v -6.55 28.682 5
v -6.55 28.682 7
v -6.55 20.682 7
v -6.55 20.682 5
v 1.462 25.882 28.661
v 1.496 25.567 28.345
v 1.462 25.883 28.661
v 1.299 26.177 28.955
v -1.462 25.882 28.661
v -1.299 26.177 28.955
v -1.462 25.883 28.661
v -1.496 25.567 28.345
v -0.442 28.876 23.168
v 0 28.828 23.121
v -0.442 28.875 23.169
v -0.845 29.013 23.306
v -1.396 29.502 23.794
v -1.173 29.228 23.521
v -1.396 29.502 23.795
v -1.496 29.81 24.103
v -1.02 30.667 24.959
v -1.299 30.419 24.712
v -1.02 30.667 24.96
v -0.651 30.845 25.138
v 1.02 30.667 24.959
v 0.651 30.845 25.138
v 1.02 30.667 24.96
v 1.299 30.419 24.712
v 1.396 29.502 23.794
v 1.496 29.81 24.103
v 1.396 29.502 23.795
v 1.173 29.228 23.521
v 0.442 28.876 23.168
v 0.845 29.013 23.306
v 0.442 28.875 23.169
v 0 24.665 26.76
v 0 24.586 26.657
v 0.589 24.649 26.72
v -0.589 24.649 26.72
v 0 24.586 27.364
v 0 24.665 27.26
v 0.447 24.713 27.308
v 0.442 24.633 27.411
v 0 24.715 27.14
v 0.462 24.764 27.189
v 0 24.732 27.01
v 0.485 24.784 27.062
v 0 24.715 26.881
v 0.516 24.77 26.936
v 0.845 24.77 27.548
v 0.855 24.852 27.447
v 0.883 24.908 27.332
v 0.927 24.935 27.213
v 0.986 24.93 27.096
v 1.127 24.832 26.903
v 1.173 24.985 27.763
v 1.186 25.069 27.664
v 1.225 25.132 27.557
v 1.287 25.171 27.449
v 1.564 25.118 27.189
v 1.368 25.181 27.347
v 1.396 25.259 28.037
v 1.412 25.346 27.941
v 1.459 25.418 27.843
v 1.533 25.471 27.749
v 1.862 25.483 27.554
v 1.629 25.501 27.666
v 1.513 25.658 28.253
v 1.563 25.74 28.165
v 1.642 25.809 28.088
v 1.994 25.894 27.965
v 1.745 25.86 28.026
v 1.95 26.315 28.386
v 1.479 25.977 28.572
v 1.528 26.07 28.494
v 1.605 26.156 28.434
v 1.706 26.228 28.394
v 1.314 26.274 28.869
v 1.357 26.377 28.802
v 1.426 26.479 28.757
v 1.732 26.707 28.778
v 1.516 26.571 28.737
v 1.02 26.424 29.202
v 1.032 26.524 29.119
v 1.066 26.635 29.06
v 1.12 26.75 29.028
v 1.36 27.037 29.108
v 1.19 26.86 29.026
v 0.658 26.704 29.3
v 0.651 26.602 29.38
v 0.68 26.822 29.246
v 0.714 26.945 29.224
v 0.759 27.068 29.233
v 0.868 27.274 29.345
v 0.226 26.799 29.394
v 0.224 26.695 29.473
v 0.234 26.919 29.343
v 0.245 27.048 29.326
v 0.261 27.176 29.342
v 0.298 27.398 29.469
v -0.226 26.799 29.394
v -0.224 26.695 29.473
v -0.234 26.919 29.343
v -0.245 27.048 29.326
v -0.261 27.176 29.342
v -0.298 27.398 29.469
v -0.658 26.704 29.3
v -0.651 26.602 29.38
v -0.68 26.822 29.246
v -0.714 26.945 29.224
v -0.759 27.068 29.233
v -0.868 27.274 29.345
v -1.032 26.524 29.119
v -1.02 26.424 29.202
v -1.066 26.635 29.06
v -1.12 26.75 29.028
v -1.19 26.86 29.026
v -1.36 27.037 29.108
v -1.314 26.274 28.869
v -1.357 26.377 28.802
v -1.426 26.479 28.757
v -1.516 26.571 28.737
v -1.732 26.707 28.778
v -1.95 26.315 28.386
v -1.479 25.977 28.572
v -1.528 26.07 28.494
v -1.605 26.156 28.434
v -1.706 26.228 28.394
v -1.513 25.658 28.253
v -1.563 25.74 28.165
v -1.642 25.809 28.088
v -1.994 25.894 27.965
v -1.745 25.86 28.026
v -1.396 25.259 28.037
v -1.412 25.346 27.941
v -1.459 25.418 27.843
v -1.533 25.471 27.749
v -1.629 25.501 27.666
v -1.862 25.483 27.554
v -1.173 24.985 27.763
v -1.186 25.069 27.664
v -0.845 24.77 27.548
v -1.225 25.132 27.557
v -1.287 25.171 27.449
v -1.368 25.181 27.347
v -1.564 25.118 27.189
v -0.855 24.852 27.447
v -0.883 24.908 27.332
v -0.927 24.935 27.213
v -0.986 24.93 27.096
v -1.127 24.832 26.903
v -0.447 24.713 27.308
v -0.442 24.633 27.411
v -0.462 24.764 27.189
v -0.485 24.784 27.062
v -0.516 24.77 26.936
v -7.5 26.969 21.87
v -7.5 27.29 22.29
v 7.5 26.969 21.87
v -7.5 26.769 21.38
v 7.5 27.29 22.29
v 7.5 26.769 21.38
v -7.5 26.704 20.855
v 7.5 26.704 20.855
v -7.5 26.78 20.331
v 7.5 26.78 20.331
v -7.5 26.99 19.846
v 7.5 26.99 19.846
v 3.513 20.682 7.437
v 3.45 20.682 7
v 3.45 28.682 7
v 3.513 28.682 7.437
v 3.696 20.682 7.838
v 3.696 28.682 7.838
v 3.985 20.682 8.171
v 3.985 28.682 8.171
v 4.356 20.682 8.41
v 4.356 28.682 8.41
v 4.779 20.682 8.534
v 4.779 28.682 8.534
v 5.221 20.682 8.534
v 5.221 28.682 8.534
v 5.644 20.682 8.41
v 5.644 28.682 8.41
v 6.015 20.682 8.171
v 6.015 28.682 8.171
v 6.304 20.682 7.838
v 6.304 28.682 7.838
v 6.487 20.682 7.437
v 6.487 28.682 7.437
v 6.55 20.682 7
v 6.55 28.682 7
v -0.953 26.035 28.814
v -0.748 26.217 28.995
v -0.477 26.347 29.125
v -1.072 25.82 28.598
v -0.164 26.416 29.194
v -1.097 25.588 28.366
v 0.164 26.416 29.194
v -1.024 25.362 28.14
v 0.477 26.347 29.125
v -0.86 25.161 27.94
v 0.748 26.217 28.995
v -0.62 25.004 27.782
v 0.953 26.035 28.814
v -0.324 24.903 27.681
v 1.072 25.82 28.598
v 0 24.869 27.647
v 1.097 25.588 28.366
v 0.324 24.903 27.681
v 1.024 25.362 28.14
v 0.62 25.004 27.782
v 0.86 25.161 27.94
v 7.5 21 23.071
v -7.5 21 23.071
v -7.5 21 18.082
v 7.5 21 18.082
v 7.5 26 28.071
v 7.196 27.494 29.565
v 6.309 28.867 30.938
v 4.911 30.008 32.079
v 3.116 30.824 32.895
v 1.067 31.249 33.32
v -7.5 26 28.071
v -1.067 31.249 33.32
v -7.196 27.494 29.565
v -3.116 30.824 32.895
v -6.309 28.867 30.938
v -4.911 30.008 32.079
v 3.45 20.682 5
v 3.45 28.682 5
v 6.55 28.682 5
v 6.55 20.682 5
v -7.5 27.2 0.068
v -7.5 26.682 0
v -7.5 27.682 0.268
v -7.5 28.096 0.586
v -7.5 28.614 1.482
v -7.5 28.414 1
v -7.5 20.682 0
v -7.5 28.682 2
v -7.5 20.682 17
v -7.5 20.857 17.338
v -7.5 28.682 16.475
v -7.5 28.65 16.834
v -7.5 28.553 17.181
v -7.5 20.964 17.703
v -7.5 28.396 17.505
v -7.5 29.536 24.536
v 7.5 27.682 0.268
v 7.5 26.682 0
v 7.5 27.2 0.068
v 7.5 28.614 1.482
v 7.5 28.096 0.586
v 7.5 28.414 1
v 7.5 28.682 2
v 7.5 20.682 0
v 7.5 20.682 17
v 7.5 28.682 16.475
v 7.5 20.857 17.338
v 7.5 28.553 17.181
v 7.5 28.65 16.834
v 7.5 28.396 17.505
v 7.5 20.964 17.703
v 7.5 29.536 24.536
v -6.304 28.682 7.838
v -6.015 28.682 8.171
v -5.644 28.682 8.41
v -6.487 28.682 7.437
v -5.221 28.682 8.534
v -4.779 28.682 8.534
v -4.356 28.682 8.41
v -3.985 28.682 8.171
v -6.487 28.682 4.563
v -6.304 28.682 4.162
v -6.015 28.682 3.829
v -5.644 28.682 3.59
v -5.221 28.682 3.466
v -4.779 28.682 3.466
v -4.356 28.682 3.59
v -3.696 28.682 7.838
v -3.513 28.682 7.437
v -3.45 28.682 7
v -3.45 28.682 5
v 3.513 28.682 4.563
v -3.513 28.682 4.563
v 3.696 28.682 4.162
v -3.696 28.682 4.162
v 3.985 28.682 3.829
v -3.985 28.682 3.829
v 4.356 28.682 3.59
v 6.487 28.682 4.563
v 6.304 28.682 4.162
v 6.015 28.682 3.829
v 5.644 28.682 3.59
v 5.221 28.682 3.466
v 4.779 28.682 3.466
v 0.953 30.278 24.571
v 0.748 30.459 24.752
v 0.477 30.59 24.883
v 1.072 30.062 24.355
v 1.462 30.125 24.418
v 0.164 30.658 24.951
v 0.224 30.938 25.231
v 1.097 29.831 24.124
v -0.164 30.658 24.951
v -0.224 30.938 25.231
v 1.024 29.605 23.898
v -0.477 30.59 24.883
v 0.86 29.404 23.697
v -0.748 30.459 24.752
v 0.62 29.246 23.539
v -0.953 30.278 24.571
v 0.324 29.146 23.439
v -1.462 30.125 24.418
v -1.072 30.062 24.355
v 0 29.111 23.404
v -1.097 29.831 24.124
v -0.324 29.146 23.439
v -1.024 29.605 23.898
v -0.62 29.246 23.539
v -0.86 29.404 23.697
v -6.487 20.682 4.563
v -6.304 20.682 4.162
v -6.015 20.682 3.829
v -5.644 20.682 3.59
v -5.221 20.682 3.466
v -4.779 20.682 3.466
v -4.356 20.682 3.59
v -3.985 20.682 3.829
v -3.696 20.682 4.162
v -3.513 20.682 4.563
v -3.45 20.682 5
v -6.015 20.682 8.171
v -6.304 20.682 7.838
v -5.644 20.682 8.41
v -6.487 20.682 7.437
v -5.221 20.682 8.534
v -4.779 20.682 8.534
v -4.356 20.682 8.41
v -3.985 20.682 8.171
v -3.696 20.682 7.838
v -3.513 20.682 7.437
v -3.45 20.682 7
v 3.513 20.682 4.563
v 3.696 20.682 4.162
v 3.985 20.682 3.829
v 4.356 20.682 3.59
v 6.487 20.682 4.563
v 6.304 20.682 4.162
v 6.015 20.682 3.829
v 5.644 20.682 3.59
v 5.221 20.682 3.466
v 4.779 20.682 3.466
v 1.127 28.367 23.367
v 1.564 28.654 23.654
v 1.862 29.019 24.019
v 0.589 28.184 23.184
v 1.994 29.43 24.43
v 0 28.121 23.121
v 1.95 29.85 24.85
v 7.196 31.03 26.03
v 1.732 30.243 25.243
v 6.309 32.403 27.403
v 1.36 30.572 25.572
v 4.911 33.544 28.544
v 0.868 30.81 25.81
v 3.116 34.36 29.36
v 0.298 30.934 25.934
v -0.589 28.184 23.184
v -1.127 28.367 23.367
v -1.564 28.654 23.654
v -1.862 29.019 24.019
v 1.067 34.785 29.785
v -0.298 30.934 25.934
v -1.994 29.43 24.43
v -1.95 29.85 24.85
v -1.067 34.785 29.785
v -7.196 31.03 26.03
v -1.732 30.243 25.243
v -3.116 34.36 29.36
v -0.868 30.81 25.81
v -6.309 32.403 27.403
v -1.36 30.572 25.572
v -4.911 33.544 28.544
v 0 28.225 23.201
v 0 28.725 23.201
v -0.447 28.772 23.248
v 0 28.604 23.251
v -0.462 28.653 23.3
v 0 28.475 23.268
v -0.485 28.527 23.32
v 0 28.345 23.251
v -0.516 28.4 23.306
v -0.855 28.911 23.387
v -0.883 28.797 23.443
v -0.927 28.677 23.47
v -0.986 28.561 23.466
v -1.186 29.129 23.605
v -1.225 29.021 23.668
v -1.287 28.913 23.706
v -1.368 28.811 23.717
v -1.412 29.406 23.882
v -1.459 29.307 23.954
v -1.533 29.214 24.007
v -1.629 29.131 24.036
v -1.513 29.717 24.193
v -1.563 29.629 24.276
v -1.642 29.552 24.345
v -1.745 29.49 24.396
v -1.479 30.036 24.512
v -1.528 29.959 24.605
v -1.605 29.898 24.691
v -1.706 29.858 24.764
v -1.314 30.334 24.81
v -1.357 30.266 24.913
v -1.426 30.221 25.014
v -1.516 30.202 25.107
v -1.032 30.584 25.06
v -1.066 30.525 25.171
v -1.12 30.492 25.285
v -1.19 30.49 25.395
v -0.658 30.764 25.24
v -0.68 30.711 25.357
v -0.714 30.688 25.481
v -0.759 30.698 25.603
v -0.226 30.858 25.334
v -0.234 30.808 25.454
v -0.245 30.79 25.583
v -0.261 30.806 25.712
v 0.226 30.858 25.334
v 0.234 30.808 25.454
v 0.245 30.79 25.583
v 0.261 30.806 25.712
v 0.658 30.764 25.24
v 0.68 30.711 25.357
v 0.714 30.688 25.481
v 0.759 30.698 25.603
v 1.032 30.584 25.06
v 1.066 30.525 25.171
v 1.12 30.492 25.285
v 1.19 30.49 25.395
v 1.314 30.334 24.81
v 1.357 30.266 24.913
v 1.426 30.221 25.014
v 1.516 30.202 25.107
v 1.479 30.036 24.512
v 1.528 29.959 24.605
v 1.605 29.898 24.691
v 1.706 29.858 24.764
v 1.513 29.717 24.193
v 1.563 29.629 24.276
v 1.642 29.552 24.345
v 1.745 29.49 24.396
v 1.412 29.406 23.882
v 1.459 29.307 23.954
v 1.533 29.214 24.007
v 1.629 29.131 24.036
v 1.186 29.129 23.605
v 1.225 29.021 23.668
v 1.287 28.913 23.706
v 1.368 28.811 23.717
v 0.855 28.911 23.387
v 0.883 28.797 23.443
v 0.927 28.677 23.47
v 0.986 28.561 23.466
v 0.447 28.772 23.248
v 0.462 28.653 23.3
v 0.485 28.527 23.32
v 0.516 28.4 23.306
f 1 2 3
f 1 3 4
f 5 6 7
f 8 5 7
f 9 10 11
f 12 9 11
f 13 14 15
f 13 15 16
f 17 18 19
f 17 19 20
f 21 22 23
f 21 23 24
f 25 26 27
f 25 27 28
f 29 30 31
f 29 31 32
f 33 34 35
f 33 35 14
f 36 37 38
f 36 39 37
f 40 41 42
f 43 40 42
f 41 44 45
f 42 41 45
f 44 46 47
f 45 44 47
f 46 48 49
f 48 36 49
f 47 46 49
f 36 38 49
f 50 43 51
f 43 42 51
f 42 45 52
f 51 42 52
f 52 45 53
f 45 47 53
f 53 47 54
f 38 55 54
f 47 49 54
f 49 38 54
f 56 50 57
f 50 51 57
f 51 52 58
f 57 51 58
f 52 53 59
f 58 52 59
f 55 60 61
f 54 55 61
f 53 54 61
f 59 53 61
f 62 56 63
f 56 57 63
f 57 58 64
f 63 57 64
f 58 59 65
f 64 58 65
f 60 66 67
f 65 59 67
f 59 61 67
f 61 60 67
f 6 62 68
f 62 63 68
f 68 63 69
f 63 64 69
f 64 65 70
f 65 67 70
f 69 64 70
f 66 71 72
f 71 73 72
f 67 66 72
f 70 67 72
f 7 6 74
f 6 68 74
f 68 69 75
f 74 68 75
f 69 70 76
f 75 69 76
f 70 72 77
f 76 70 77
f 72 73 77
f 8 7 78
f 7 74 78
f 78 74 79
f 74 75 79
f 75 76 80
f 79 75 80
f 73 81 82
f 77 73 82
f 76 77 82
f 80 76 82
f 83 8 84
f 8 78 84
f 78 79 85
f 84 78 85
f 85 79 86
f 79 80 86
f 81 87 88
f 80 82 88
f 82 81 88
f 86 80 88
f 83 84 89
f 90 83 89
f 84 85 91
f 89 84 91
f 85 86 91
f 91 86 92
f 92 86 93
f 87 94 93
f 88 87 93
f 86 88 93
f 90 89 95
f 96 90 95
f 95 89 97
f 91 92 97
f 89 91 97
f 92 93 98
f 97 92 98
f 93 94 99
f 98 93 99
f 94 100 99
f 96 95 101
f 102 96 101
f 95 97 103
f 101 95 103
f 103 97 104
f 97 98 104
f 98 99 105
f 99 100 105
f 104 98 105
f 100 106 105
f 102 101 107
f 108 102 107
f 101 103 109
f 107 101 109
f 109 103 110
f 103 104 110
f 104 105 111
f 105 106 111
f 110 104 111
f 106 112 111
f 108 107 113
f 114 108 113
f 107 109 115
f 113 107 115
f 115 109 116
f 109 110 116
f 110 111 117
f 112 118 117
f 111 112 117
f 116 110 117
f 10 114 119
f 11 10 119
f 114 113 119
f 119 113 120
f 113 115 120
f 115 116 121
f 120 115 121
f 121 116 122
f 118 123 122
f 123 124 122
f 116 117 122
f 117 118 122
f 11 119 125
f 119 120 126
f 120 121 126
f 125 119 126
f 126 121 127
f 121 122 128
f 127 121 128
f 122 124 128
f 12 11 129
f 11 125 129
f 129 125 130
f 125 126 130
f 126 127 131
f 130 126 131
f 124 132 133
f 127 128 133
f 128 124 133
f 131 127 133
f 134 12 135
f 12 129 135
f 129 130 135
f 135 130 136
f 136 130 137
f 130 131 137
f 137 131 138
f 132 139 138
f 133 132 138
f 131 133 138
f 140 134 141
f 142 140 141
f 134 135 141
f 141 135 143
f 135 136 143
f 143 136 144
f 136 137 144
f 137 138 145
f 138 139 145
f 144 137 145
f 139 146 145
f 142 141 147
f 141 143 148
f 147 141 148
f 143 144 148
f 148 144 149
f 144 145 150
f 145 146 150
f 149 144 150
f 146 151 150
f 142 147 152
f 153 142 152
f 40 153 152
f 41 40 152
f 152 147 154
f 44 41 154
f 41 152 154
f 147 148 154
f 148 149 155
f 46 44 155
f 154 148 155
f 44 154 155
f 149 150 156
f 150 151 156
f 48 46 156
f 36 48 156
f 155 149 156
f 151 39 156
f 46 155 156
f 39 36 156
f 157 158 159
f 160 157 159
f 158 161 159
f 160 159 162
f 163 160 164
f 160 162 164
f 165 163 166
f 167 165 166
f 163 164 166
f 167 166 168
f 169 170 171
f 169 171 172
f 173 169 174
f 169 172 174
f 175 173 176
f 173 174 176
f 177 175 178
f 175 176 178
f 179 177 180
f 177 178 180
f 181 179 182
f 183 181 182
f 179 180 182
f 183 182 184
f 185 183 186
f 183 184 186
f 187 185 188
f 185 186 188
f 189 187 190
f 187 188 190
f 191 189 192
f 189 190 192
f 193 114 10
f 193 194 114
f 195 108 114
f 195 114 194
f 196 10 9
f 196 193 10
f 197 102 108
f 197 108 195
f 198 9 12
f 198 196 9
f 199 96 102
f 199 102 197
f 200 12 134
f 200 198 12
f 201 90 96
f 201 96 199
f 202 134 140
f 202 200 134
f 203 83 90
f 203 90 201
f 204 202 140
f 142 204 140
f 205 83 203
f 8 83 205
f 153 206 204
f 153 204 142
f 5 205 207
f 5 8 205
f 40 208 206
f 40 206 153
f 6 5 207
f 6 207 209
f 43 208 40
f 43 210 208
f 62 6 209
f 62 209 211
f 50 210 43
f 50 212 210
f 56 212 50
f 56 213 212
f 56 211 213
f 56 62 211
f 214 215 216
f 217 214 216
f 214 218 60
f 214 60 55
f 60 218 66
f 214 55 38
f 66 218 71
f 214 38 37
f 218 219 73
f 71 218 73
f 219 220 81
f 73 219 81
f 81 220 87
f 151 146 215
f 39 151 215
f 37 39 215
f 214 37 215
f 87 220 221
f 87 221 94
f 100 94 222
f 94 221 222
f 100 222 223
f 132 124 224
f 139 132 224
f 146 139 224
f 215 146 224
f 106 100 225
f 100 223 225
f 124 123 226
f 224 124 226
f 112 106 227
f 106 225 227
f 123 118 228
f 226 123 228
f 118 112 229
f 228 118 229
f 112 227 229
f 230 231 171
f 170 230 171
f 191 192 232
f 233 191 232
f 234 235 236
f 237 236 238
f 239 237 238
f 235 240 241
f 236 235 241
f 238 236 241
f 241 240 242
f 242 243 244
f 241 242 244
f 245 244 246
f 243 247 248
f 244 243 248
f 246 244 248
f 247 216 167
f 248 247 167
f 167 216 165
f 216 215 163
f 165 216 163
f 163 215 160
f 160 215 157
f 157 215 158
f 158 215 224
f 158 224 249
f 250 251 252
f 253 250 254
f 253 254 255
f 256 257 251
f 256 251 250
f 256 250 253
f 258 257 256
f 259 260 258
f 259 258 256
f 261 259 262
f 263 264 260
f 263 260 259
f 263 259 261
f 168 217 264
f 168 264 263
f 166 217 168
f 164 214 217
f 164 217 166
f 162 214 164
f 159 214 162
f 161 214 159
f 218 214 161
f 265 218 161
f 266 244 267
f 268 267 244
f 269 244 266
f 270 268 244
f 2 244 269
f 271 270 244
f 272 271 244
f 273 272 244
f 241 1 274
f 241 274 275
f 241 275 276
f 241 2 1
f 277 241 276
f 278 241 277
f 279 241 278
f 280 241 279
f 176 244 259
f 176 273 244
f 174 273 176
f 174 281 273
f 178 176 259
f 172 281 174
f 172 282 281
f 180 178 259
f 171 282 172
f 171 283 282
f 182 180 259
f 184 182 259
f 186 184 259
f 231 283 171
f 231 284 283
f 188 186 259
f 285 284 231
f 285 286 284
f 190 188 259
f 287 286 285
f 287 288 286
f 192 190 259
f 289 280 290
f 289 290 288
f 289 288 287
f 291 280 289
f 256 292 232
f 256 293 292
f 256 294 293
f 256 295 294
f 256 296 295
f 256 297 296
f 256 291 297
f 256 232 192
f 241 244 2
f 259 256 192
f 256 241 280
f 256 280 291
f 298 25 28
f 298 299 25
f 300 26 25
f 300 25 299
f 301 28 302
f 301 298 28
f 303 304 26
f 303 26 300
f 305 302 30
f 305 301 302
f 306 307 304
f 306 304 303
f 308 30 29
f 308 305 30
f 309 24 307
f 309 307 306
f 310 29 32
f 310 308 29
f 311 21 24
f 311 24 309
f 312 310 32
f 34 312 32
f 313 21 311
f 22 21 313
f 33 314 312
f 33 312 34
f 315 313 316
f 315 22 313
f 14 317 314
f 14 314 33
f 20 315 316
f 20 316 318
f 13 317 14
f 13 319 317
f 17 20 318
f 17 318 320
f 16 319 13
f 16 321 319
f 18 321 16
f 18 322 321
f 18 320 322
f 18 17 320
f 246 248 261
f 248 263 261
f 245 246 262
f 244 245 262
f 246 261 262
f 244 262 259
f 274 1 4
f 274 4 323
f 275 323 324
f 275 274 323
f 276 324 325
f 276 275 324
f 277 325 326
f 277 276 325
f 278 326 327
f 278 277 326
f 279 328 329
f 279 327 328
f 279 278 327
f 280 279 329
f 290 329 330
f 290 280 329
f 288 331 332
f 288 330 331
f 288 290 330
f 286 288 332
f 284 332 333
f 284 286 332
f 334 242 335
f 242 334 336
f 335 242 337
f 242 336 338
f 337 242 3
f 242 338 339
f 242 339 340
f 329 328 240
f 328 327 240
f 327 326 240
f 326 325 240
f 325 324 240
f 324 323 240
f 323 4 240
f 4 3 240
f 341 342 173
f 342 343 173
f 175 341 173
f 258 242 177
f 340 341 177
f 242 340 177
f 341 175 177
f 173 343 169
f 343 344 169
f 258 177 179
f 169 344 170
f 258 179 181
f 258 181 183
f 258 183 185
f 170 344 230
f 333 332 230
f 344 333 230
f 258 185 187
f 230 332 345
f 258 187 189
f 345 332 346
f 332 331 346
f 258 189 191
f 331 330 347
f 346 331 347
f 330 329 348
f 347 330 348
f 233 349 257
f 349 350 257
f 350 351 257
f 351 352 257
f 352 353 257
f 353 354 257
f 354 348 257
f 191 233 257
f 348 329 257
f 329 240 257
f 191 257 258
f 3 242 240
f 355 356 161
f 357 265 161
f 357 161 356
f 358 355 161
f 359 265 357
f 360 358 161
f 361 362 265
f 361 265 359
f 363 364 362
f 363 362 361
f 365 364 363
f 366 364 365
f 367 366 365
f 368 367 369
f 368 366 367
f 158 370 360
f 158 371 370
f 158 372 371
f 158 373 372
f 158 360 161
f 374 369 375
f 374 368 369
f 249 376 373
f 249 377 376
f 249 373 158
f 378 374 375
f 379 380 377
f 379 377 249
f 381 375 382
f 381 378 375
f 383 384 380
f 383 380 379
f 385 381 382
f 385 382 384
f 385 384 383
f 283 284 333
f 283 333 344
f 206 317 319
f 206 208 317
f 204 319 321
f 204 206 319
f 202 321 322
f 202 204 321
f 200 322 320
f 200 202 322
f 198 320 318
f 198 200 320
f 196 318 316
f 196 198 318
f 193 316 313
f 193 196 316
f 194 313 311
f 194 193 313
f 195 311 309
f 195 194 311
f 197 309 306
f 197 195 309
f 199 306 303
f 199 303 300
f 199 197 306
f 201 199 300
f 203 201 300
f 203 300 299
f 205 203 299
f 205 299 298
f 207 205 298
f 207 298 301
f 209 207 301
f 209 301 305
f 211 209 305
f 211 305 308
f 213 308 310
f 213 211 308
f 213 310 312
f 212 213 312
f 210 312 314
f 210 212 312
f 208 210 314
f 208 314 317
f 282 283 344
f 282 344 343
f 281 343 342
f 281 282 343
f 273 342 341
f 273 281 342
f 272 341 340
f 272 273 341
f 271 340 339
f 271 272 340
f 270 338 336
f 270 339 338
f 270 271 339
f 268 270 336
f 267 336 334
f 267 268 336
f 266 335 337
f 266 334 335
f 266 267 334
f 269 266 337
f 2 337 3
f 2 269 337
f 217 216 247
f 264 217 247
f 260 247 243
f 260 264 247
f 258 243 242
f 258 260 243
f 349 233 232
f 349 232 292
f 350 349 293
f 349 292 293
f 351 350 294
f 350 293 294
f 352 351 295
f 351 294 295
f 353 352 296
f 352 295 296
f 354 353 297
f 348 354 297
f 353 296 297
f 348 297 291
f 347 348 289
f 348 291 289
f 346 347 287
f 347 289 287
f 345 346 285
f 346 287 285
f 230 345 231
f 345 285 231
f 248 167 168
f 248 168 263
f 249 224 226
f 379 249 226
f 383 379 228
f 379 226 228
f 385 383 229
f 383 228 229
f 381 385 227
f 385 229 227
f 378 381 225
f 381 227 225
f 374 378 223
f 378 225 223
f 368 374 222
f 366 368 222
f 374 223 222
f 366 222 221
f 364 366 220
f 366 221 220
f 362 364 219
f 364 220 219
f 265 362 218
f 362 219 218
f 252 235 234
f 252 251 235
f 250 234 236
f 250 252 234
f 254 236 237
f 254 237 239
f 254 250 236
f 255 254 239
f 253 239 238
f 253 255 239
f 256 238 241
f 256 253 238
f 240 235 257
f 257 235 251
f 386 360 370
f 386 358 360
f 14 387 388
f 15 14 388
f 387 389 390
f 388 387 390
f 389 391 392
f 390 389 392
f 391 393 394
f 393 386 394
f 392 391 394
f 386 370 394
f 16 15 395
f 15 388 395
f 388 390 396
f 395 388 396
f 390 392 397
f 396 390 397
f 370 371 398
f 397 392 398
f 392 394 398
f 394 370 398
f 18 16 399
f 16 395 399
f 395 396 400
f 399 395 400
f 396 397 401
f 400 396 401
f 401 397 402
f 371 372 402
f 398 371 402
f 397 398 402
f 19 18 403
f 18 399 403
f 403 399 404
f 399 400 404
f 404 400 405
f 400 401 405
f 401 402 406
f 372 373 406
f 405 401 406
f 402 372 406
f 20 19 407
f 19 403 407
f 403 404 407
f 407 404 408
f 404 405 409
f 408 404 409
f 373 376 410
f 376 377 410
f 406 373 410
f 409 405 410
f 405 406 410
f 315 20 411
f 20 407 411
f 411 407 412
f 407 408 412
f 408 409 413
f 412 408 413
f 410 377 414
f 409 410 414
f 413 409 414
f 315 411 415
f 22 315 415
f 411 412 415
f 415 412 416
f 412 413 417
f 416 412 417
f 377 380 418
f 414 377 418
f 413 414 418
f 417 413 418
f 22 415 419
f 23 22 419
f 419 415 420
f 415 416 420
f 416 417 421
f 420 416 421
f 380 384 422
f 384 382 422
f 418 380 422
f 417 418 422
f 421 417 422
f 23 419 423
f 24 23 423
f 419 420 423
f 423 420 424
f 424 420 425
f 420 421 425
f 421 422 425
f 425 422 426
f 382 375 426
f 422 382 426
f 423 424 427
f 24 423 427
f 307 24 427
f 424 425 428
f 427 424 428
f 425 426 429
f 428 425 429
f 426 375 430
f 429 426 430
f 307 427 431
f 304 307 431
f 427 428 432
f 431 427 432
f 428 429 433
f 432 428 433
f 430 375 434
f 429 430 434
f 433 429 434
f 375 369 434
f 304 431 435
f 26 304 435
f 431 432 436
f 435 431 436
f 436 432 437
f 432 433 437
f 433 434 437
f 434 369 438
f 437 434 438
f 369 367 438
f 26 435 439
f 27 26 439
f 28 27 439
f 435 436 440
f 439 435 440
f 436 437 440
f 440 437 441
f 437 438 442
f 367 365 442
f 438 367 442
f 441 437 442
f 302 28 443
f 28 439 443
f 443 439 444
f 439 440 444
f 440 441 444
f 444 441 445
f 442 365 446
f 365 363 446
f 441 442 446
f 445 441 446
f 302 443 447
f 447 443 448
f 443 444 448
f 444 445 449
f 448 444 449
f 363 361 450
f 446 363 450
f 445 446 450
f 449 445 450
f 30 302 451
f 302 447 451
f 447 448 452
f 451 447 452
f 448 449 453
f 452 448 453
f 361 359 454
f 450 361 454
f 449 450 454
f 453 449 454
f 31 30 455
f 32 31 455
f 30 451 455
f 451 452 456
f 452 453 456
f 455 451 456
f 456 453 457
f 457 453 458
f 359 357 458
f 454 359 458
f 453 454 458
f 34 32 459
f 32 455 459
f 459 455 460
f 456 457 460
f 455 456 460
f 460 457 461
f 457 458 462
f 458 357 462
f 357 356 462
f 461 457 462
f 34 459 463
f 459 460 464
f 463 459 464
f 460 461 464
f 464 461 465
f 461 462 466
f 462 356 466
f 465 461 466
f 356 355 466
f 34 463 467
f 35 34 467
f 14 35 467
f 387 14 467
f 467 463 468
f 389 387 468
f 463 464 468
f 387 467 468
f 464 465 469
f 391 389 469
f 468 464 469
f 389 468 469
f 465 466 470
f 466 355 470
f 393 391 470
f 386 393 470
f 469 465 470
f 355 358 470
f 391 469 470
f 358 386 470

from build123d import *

# Parameters (mm, degrees)
SKETCH_10_W         = 15
SKETCH_10_H         = 8
EXTRUDE_7_DEPTH     = 11
CUT_EXTRUDE_4_DEPTH = 11
SKETCH_12_W         = 15
SKETCH_12_H         = 6
EXTRUDE_8_DEPTH     = 6
SKETCH_14_W         = 15
SKETCH_14_H         = 5
EXTRUDE_9_DEPTH     = 4
EXTRUDE_10_DEPTH    = 15
EXTRUDE_11_DEPTH    = 5
SKETCH_19_R         = 1.1
CUT_EXTRUDE_5_DEPTH = 5
EXTRUDE_START       = 0.5
SKETCH_20_R         = 1.5
SKETCH_20_R_2       = 1.1
EXTRUDE_12_DEPTH    = 0.5
SKETCH_21_R         = 1.5
SKETCH_21_R_2       = 1.1
EXTRUDE_13_DEPTH    = 0.5
FILLET_4_R          = 0.5
CHAMFER_1_SIZE      = 4.493554602
CHAMFER_1_SIZE_2    = 2.7
FILLET_7_R          = 2
SKETCH_22_W         = 15
SKETCH_22_H         = 2
EXTRUDE_14_DEPTH    = 6
FILLET_8_R          = 2
FILLET_9_R          = 2


# Some blends are built 0.0001 mm under size
with BuildPart() as part:
    # 草图10 → 凸台-拉伸7 (new body)
    with BuildSketch(Plane.XY):
        with Locations((0, 24.68211788)):
            Rectangle(SKETCH_10_W, SKETCH_10_H)
    extrude(amount=EXTRUDE_7_DEPTH)

    # 草图11 → 切除-拉伸4 (cut)
    with BuildSketch(Plane(origin=(0, 28.68211788, 0), x_dir=(1, 0, 0), z_dir=(0, 1, 0))):
        with BuildLine():
            Line((-3.45, -5), (-3.45, -7))
            ThreePointArc((-3.45, -7), (-5, -8.55), (-6.55, -7))
            Line((-6.55, -7), (-6.55, -5))
            ThreePointArc((-6.55, -5), (-5, -3.45), (-3.45, -5))
        make_face()
        with BuildLine():
            Line((3.45, -5), (3.45, -7))
            ThreePointArc((3.45, -7), (5, -8.55), (6.55, -7))
            Line((6.55, -7), (6.55, -5))
            ThreePointArc((6.55, -5), (5, -3.45), (3.45, -5))
        make_face()
    extrude(amount=-CUT_EXTRUDE_4_DEPTH, mode=Mode.SUBTRACT)

    # 草图12 → 凸台-拉伸8 (add)
    with BuildSketch(Plane.XY.offset(11)):
        with Locations((0, 25.68211788)):
            Rectangle(SKETCH_12_W, SKETCH_12_H)
    extrude(amount=EXTRUDE_8_DEPTH)

    # 草图14 → 凸台-拉伸9 (add)
    with BuildSketch(Plane.XY.offset(17)):
        with Locations((0, 23.5)):
            Rectangle(SKETCH_14_W, SKETCH_14_H)
    extrude(amount=EXTRUDE_9_DEPTH)

    # 草图17 → 凸台-拉伸10 (add)
    with BuildSketch(Plane.ZY.offset(7.5)):
        Polygon((21, 26), (24.535533906, 29.535533906), (28.071067812, 26), (23.071067812, 21), (21, 21), align=None)
    extrude(amount=-EXTRUDE_10_DEPTH)

    # 草图18 → 凸台-拉伸11 (add)
    with BuildSketch(Plane(origin=(0, -1.035533906, 1.035533906), x_dir=(1, 0, 0), z_dir=(0, -0.7071067811865507, 0.7071067811865445))):
        with BuildLine():
            Line((7.5, 38.234018716), (-7.5, 38.234018716))
            ThreePointArc((-7.5, 38.234018716), (0, 45.734018716), (7.5, 38.234018716))
        make_face()
    extrude(amount=-EXTRUDE_11_DEPTH)

    # 草图19 → 切除-拉伸5 (cut)
    with BuildSketch(Plane(origin=(0, -1.035533906, 1.035533906), x_dir=(1, 0, 0), z_dir=(0, -0.7071067811865507, 0.7071067811865445))):
        with Locations(Location((0, 38.234018716, 0), (0, 0, 270))):
            Circle(SKETCH_19_R)
    extrude(amount=-CUT_EXTRUDE_5_DEPTH, mode=Mode.SUBTRACT)

    # 草图20 → 凸台-拉伸12 (add)
    with BuildSketch(Plane(origin=(0, -1.035533906, 1.035533906), x_dir=(1, 0, 0), z_dir=(0, -0.7071067811865507, 0.7071067811865445)).offset(EXTRUDE_START)):
        with Locations(Location((0, 38.234018716, 0), (0, 0, 270))):
            Circle(SKETCH_20_R)
        with Locations(Location((0, 38.234018716, 0), (0, 0, 270))):
            Circle(SKETCH_20_R_2, mode=Mode.SUBTRACT)
    extrude(amount=-EXTRUDE_12_DEPTH)

    # 草图21 → 凸台-拉伸13 (add)
    with BuildSketch(Plane(origin=(0, 2.5, -2.5), x_dir=(1, 0, 0), z_dir=(0, 0.7071067811865513, -0.7071067811865437))):
        with Locations(Location((0, -38.234018716, 0), (0, 0, 90))):
            Circle(SKETCH_21_R)
        with Locations(Location((0, -38.234018716, 0), (0, 0, 90))):
            Circle(SKETCH_21_R_2, mode=Mode.SUBTRACT)
    extrude(amount=EXTRUDE_13_DEPTH)

    # 圆角4
    fillet_4_edges = [part.edges().sort_by_distance(p)[0] for p in [
        (0, 27.060660172, 29.131727984),
        (0, 30.596194078, 25.596194078),
    ]]
    fillet(fillet_4_edges, radius=FILLET_4_R - 0.0001)  # a hair under: the kernel refuses the full size

    # 倒角1
    # the kernel refuses this chamfer: 4.493554602, 2.7 mm, written as the material it adds along each edge
    with BuildSketch(Plane(origin=(-7.5, 26, 17), x_dir=(0, -0.01991463058083334, 0.9998016840798123), z_dir=(1, 0, 0))) as chamfer_1_piece_1_section:
        Polygon((CHAMFER_1_SIZE * 0.999801684157, -CHAMFER_1_SIZE * 0.0199146305824), (-CHAMFER_1_SIZE_2 * 0.0199146305808, -CHAMFER_1_SIZE_2 * 0.99980168408), (0, 0), align=None)
    chamfer_1_piece_1 = extrude(amount=15, mode=Mode.PRIVATE)
    chamfer_1_piece_1 = split(chamfer_1_piece_1, bisect_by=Plane(origin=(0, 28.68211788, 18.477199106), z_dir=(0, -1, 0)), keep=Keep.TOP, mode=Mode.PRIVATE)
    add(chamfer_1_piece_1)

    # 圆角7
    fillet_7_edges = [part.edges().sort_by_distance(p)[0] for p in [
        (0, 26.18524881, 21.18524881),
        (0, 28.68211788, 17.029760846),
    ]]
    fillet(fillet_7_edges, radius=FILLET_7_R)

    # 草图22 → 凸台-拉伸14 (add)
    with BuildSketch(Plane.XY.offset(11)):
        with Locations((0, 21.68211788)):
            Rectangle(SKETCH_22_W, SKETCH_22_H)
    extrude(amount=EXTRUDE_14_DEPTH)

    # 圆角8
    # the kernel refuses this fillet: 2 mm, written as the material it adds along each edge
    with BuildSketch(Plane(origin=(7.5, 21, 17), x_dir=(0, -1.0, 7.298057631676466e-12), z_dir=(-1, 0, 0))) as fillet_8_piece_1:
        with BuildLine():
            CenterArc((2, 1.08188698), FILLET_8_R, 180, 32.747889427)
            Line((0, 1.08188698), (-0.04, 1.08188698))
            Line((-0.04, 1.08188698), (-0.04, 0))
            Line((-0.04, 0), (0, -0.04))
            ThreePointArc((0, -0.04), (0.15894106, -0.04), (0.284239762, -0.02163774))
            Line((0.284239762, -0.02163774), (0.31788212, 0))
        make_face()
    extrude(amount=15)

    # 圆角9
    fillet_9_edges = [part.edges().sort_by_distance(p)[0] for p in [
        (0, 28.68211788, 0),
    ]]
    fillet(fillet_9_edges, radius=FILLET_9_R)


solid = part.part
